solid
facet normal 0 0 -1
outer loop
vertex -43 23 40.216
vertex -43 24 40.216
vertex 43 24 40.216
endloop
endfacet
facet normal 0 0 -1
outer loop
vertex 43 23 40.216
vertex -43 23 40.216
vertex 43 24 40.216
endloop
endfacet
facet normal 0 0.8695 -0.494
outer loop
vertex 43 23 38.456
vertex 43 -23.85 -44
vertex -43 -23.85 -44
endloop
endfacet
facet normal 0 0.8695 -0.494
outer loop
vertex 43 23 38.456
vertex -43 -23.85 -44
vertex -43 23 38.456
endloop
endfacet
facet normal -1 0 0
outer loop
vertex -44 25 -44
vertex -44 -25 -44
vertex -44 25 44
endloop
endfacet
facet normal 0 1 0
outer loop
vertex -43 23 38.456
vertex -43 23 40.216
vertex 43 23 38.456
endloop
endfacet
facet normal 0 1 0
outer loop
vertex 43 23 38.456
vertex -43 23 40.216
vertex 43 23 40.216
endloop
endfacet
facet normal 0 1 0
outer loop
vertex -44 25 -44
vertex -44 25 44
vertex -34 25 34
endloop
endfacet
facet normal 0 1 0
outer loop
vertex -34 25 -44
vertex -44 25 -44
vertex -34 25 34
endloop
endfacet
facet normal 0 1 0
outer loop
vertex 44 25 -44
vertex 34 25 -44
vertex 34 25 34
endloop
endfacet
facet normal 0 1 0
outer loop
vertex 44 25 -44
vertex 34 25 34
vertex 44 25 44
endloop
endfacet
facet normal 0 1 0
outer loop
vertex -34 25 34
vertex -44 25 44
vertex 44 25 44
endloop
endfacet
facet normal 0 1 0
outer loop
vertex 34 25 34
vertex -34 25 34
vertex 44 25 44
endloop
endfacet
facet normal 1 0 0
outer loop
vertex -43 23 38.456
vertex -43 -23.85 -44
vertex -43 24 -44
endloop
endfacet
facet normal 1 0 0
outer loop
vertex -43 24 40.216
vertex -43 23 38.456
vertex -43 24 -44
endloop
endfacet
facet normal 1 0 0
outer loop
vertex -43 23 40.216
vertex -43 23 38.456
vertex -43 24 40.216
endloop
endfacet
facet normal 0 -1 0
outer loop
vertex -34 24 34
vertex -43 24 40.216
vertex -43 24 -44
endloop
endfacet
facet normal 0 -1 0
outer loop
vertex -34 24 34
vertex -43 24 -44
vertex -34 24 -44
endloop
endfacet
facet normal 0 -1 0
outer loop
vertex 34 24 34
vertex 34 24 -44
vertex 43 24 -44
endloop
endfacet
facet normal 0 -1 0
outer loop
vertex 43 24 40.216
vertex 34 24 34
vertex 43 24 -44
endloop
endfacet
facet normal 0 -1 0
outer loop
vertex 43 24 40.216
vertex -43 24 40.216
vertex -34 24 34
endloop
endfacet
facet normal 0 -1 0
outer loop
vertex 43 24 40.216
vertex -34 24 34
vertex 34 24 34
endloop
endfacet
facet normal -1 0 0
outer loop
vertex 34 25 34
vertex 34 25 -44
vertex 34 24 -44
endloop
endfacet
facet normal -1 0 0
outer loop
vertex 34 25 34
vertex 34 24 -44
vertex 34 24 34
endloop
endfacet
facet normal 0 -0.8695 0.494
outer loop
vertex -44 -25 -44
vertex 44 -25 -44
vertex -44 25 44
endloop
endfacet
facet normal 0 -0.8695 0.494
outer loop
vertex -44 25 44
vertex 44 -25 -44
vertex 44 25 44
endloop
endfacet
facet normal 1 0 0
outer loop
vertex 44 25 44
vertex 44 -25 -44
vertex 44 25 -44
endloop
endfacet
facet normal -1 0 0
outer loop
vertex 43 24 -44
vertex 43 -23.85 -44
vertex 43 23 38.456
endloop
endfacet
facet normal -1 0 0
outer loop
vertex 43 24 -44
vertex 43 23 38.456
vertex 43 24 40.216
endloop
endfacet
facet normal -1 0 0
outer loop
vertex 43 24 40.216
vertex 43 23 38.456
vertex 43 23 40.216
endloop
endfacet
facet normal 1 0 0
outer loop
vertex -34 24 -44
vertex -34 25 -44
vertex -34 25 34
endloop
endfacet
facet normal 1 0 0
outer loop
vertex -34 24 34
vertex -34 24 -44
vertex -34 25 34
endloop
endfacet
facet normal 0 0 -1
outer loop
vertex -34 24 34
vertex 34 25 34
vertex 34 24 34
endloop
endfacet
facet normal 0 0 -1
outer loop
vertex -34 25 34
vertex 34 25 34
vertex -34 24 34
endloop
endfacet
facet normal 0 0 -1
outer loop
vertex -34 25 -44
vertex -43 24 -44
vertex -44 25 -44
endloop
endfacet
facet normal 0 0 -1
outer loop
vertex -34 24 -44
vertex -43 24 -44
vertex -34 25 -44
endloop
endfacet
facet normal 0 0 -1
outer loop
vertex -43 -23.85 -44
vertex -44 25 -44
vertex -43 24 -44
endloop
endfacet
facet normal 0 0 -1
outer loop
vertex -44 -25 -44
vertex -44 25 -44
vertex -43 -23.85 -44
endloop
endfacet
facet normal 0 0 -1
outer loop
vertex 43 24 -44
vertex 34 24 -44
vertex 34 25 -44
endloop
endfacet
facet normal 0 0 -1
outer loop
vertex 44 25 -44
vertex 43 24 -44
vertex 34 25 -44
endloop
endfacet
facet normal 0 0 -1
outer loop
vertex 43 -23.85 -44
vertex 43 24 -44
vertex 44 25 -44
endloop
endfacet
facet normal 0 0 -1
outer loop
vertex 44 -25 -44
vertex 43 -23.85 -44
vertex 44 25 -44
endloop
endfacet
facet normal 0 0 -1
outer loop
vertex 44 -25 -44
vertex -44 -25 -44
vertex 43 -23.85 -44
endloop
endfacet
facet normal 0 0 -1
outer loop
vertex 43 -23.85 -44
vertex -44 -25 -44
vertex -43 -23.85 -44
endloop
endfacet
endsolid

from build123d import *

# Parameters (mm, degrees)
F0_W      = 88
F0_H      = 88
F1_DEPTH  = 25
F3_DEPTH  = 50
F4_T      = -1
F5_W      = 68
F5_H      = 78
F4_FACE_W = 86
F4_FACE_H = 84.2157470514
F6_DEPTH  = 1


with BuildPart() as f1:
    # F0 (on Front) → F1 (new body, symmetric)
    with BuildSketch(Plane.XZ):
        Rectangle(F0_W, F0_H)
    extrude(amount=F1_DEPTH, both=True)

    # F2 (on Right) → F3 (cut, symmetric)
    with BuildSketch(Plane.YZ):
        Polygon((-25, -44), (25, 44), (-25, 44), align=None)
    extrude(amount=F3_DEPTH, both=True, mode=Mode.SUBTRACT)

    # F4
    f4_openings = [f1.faces().sort_by_distance(p)[0] for p in [
        (0, 0, -44),
    ]]
    offset(amount=F4_T, openings=f4_openings)

    # F5 (on face) + F4_face (on face) → F6 (cut)
    with BuildSketch(Plane(origin=(0, 25, 0), x_dir=(-1, 0, 0), z_dir=(0, 1, 0))):
        with Locations((0, -5)):
            Rectangle(F5_W, F5_H)
    with BuildSketch(Plane(origin=(0, 24, -1.8921264743), x_dir=(1, 0, 0), z_dir=(0, -1, 0))):
        Rectangle(F4_FACE_W, F4_FACE_H)
    extrude(amount=-F6_DEPTH, dir=(0, 1, 0), mode=Mode.SUBTRACT)


solid = f1.part
